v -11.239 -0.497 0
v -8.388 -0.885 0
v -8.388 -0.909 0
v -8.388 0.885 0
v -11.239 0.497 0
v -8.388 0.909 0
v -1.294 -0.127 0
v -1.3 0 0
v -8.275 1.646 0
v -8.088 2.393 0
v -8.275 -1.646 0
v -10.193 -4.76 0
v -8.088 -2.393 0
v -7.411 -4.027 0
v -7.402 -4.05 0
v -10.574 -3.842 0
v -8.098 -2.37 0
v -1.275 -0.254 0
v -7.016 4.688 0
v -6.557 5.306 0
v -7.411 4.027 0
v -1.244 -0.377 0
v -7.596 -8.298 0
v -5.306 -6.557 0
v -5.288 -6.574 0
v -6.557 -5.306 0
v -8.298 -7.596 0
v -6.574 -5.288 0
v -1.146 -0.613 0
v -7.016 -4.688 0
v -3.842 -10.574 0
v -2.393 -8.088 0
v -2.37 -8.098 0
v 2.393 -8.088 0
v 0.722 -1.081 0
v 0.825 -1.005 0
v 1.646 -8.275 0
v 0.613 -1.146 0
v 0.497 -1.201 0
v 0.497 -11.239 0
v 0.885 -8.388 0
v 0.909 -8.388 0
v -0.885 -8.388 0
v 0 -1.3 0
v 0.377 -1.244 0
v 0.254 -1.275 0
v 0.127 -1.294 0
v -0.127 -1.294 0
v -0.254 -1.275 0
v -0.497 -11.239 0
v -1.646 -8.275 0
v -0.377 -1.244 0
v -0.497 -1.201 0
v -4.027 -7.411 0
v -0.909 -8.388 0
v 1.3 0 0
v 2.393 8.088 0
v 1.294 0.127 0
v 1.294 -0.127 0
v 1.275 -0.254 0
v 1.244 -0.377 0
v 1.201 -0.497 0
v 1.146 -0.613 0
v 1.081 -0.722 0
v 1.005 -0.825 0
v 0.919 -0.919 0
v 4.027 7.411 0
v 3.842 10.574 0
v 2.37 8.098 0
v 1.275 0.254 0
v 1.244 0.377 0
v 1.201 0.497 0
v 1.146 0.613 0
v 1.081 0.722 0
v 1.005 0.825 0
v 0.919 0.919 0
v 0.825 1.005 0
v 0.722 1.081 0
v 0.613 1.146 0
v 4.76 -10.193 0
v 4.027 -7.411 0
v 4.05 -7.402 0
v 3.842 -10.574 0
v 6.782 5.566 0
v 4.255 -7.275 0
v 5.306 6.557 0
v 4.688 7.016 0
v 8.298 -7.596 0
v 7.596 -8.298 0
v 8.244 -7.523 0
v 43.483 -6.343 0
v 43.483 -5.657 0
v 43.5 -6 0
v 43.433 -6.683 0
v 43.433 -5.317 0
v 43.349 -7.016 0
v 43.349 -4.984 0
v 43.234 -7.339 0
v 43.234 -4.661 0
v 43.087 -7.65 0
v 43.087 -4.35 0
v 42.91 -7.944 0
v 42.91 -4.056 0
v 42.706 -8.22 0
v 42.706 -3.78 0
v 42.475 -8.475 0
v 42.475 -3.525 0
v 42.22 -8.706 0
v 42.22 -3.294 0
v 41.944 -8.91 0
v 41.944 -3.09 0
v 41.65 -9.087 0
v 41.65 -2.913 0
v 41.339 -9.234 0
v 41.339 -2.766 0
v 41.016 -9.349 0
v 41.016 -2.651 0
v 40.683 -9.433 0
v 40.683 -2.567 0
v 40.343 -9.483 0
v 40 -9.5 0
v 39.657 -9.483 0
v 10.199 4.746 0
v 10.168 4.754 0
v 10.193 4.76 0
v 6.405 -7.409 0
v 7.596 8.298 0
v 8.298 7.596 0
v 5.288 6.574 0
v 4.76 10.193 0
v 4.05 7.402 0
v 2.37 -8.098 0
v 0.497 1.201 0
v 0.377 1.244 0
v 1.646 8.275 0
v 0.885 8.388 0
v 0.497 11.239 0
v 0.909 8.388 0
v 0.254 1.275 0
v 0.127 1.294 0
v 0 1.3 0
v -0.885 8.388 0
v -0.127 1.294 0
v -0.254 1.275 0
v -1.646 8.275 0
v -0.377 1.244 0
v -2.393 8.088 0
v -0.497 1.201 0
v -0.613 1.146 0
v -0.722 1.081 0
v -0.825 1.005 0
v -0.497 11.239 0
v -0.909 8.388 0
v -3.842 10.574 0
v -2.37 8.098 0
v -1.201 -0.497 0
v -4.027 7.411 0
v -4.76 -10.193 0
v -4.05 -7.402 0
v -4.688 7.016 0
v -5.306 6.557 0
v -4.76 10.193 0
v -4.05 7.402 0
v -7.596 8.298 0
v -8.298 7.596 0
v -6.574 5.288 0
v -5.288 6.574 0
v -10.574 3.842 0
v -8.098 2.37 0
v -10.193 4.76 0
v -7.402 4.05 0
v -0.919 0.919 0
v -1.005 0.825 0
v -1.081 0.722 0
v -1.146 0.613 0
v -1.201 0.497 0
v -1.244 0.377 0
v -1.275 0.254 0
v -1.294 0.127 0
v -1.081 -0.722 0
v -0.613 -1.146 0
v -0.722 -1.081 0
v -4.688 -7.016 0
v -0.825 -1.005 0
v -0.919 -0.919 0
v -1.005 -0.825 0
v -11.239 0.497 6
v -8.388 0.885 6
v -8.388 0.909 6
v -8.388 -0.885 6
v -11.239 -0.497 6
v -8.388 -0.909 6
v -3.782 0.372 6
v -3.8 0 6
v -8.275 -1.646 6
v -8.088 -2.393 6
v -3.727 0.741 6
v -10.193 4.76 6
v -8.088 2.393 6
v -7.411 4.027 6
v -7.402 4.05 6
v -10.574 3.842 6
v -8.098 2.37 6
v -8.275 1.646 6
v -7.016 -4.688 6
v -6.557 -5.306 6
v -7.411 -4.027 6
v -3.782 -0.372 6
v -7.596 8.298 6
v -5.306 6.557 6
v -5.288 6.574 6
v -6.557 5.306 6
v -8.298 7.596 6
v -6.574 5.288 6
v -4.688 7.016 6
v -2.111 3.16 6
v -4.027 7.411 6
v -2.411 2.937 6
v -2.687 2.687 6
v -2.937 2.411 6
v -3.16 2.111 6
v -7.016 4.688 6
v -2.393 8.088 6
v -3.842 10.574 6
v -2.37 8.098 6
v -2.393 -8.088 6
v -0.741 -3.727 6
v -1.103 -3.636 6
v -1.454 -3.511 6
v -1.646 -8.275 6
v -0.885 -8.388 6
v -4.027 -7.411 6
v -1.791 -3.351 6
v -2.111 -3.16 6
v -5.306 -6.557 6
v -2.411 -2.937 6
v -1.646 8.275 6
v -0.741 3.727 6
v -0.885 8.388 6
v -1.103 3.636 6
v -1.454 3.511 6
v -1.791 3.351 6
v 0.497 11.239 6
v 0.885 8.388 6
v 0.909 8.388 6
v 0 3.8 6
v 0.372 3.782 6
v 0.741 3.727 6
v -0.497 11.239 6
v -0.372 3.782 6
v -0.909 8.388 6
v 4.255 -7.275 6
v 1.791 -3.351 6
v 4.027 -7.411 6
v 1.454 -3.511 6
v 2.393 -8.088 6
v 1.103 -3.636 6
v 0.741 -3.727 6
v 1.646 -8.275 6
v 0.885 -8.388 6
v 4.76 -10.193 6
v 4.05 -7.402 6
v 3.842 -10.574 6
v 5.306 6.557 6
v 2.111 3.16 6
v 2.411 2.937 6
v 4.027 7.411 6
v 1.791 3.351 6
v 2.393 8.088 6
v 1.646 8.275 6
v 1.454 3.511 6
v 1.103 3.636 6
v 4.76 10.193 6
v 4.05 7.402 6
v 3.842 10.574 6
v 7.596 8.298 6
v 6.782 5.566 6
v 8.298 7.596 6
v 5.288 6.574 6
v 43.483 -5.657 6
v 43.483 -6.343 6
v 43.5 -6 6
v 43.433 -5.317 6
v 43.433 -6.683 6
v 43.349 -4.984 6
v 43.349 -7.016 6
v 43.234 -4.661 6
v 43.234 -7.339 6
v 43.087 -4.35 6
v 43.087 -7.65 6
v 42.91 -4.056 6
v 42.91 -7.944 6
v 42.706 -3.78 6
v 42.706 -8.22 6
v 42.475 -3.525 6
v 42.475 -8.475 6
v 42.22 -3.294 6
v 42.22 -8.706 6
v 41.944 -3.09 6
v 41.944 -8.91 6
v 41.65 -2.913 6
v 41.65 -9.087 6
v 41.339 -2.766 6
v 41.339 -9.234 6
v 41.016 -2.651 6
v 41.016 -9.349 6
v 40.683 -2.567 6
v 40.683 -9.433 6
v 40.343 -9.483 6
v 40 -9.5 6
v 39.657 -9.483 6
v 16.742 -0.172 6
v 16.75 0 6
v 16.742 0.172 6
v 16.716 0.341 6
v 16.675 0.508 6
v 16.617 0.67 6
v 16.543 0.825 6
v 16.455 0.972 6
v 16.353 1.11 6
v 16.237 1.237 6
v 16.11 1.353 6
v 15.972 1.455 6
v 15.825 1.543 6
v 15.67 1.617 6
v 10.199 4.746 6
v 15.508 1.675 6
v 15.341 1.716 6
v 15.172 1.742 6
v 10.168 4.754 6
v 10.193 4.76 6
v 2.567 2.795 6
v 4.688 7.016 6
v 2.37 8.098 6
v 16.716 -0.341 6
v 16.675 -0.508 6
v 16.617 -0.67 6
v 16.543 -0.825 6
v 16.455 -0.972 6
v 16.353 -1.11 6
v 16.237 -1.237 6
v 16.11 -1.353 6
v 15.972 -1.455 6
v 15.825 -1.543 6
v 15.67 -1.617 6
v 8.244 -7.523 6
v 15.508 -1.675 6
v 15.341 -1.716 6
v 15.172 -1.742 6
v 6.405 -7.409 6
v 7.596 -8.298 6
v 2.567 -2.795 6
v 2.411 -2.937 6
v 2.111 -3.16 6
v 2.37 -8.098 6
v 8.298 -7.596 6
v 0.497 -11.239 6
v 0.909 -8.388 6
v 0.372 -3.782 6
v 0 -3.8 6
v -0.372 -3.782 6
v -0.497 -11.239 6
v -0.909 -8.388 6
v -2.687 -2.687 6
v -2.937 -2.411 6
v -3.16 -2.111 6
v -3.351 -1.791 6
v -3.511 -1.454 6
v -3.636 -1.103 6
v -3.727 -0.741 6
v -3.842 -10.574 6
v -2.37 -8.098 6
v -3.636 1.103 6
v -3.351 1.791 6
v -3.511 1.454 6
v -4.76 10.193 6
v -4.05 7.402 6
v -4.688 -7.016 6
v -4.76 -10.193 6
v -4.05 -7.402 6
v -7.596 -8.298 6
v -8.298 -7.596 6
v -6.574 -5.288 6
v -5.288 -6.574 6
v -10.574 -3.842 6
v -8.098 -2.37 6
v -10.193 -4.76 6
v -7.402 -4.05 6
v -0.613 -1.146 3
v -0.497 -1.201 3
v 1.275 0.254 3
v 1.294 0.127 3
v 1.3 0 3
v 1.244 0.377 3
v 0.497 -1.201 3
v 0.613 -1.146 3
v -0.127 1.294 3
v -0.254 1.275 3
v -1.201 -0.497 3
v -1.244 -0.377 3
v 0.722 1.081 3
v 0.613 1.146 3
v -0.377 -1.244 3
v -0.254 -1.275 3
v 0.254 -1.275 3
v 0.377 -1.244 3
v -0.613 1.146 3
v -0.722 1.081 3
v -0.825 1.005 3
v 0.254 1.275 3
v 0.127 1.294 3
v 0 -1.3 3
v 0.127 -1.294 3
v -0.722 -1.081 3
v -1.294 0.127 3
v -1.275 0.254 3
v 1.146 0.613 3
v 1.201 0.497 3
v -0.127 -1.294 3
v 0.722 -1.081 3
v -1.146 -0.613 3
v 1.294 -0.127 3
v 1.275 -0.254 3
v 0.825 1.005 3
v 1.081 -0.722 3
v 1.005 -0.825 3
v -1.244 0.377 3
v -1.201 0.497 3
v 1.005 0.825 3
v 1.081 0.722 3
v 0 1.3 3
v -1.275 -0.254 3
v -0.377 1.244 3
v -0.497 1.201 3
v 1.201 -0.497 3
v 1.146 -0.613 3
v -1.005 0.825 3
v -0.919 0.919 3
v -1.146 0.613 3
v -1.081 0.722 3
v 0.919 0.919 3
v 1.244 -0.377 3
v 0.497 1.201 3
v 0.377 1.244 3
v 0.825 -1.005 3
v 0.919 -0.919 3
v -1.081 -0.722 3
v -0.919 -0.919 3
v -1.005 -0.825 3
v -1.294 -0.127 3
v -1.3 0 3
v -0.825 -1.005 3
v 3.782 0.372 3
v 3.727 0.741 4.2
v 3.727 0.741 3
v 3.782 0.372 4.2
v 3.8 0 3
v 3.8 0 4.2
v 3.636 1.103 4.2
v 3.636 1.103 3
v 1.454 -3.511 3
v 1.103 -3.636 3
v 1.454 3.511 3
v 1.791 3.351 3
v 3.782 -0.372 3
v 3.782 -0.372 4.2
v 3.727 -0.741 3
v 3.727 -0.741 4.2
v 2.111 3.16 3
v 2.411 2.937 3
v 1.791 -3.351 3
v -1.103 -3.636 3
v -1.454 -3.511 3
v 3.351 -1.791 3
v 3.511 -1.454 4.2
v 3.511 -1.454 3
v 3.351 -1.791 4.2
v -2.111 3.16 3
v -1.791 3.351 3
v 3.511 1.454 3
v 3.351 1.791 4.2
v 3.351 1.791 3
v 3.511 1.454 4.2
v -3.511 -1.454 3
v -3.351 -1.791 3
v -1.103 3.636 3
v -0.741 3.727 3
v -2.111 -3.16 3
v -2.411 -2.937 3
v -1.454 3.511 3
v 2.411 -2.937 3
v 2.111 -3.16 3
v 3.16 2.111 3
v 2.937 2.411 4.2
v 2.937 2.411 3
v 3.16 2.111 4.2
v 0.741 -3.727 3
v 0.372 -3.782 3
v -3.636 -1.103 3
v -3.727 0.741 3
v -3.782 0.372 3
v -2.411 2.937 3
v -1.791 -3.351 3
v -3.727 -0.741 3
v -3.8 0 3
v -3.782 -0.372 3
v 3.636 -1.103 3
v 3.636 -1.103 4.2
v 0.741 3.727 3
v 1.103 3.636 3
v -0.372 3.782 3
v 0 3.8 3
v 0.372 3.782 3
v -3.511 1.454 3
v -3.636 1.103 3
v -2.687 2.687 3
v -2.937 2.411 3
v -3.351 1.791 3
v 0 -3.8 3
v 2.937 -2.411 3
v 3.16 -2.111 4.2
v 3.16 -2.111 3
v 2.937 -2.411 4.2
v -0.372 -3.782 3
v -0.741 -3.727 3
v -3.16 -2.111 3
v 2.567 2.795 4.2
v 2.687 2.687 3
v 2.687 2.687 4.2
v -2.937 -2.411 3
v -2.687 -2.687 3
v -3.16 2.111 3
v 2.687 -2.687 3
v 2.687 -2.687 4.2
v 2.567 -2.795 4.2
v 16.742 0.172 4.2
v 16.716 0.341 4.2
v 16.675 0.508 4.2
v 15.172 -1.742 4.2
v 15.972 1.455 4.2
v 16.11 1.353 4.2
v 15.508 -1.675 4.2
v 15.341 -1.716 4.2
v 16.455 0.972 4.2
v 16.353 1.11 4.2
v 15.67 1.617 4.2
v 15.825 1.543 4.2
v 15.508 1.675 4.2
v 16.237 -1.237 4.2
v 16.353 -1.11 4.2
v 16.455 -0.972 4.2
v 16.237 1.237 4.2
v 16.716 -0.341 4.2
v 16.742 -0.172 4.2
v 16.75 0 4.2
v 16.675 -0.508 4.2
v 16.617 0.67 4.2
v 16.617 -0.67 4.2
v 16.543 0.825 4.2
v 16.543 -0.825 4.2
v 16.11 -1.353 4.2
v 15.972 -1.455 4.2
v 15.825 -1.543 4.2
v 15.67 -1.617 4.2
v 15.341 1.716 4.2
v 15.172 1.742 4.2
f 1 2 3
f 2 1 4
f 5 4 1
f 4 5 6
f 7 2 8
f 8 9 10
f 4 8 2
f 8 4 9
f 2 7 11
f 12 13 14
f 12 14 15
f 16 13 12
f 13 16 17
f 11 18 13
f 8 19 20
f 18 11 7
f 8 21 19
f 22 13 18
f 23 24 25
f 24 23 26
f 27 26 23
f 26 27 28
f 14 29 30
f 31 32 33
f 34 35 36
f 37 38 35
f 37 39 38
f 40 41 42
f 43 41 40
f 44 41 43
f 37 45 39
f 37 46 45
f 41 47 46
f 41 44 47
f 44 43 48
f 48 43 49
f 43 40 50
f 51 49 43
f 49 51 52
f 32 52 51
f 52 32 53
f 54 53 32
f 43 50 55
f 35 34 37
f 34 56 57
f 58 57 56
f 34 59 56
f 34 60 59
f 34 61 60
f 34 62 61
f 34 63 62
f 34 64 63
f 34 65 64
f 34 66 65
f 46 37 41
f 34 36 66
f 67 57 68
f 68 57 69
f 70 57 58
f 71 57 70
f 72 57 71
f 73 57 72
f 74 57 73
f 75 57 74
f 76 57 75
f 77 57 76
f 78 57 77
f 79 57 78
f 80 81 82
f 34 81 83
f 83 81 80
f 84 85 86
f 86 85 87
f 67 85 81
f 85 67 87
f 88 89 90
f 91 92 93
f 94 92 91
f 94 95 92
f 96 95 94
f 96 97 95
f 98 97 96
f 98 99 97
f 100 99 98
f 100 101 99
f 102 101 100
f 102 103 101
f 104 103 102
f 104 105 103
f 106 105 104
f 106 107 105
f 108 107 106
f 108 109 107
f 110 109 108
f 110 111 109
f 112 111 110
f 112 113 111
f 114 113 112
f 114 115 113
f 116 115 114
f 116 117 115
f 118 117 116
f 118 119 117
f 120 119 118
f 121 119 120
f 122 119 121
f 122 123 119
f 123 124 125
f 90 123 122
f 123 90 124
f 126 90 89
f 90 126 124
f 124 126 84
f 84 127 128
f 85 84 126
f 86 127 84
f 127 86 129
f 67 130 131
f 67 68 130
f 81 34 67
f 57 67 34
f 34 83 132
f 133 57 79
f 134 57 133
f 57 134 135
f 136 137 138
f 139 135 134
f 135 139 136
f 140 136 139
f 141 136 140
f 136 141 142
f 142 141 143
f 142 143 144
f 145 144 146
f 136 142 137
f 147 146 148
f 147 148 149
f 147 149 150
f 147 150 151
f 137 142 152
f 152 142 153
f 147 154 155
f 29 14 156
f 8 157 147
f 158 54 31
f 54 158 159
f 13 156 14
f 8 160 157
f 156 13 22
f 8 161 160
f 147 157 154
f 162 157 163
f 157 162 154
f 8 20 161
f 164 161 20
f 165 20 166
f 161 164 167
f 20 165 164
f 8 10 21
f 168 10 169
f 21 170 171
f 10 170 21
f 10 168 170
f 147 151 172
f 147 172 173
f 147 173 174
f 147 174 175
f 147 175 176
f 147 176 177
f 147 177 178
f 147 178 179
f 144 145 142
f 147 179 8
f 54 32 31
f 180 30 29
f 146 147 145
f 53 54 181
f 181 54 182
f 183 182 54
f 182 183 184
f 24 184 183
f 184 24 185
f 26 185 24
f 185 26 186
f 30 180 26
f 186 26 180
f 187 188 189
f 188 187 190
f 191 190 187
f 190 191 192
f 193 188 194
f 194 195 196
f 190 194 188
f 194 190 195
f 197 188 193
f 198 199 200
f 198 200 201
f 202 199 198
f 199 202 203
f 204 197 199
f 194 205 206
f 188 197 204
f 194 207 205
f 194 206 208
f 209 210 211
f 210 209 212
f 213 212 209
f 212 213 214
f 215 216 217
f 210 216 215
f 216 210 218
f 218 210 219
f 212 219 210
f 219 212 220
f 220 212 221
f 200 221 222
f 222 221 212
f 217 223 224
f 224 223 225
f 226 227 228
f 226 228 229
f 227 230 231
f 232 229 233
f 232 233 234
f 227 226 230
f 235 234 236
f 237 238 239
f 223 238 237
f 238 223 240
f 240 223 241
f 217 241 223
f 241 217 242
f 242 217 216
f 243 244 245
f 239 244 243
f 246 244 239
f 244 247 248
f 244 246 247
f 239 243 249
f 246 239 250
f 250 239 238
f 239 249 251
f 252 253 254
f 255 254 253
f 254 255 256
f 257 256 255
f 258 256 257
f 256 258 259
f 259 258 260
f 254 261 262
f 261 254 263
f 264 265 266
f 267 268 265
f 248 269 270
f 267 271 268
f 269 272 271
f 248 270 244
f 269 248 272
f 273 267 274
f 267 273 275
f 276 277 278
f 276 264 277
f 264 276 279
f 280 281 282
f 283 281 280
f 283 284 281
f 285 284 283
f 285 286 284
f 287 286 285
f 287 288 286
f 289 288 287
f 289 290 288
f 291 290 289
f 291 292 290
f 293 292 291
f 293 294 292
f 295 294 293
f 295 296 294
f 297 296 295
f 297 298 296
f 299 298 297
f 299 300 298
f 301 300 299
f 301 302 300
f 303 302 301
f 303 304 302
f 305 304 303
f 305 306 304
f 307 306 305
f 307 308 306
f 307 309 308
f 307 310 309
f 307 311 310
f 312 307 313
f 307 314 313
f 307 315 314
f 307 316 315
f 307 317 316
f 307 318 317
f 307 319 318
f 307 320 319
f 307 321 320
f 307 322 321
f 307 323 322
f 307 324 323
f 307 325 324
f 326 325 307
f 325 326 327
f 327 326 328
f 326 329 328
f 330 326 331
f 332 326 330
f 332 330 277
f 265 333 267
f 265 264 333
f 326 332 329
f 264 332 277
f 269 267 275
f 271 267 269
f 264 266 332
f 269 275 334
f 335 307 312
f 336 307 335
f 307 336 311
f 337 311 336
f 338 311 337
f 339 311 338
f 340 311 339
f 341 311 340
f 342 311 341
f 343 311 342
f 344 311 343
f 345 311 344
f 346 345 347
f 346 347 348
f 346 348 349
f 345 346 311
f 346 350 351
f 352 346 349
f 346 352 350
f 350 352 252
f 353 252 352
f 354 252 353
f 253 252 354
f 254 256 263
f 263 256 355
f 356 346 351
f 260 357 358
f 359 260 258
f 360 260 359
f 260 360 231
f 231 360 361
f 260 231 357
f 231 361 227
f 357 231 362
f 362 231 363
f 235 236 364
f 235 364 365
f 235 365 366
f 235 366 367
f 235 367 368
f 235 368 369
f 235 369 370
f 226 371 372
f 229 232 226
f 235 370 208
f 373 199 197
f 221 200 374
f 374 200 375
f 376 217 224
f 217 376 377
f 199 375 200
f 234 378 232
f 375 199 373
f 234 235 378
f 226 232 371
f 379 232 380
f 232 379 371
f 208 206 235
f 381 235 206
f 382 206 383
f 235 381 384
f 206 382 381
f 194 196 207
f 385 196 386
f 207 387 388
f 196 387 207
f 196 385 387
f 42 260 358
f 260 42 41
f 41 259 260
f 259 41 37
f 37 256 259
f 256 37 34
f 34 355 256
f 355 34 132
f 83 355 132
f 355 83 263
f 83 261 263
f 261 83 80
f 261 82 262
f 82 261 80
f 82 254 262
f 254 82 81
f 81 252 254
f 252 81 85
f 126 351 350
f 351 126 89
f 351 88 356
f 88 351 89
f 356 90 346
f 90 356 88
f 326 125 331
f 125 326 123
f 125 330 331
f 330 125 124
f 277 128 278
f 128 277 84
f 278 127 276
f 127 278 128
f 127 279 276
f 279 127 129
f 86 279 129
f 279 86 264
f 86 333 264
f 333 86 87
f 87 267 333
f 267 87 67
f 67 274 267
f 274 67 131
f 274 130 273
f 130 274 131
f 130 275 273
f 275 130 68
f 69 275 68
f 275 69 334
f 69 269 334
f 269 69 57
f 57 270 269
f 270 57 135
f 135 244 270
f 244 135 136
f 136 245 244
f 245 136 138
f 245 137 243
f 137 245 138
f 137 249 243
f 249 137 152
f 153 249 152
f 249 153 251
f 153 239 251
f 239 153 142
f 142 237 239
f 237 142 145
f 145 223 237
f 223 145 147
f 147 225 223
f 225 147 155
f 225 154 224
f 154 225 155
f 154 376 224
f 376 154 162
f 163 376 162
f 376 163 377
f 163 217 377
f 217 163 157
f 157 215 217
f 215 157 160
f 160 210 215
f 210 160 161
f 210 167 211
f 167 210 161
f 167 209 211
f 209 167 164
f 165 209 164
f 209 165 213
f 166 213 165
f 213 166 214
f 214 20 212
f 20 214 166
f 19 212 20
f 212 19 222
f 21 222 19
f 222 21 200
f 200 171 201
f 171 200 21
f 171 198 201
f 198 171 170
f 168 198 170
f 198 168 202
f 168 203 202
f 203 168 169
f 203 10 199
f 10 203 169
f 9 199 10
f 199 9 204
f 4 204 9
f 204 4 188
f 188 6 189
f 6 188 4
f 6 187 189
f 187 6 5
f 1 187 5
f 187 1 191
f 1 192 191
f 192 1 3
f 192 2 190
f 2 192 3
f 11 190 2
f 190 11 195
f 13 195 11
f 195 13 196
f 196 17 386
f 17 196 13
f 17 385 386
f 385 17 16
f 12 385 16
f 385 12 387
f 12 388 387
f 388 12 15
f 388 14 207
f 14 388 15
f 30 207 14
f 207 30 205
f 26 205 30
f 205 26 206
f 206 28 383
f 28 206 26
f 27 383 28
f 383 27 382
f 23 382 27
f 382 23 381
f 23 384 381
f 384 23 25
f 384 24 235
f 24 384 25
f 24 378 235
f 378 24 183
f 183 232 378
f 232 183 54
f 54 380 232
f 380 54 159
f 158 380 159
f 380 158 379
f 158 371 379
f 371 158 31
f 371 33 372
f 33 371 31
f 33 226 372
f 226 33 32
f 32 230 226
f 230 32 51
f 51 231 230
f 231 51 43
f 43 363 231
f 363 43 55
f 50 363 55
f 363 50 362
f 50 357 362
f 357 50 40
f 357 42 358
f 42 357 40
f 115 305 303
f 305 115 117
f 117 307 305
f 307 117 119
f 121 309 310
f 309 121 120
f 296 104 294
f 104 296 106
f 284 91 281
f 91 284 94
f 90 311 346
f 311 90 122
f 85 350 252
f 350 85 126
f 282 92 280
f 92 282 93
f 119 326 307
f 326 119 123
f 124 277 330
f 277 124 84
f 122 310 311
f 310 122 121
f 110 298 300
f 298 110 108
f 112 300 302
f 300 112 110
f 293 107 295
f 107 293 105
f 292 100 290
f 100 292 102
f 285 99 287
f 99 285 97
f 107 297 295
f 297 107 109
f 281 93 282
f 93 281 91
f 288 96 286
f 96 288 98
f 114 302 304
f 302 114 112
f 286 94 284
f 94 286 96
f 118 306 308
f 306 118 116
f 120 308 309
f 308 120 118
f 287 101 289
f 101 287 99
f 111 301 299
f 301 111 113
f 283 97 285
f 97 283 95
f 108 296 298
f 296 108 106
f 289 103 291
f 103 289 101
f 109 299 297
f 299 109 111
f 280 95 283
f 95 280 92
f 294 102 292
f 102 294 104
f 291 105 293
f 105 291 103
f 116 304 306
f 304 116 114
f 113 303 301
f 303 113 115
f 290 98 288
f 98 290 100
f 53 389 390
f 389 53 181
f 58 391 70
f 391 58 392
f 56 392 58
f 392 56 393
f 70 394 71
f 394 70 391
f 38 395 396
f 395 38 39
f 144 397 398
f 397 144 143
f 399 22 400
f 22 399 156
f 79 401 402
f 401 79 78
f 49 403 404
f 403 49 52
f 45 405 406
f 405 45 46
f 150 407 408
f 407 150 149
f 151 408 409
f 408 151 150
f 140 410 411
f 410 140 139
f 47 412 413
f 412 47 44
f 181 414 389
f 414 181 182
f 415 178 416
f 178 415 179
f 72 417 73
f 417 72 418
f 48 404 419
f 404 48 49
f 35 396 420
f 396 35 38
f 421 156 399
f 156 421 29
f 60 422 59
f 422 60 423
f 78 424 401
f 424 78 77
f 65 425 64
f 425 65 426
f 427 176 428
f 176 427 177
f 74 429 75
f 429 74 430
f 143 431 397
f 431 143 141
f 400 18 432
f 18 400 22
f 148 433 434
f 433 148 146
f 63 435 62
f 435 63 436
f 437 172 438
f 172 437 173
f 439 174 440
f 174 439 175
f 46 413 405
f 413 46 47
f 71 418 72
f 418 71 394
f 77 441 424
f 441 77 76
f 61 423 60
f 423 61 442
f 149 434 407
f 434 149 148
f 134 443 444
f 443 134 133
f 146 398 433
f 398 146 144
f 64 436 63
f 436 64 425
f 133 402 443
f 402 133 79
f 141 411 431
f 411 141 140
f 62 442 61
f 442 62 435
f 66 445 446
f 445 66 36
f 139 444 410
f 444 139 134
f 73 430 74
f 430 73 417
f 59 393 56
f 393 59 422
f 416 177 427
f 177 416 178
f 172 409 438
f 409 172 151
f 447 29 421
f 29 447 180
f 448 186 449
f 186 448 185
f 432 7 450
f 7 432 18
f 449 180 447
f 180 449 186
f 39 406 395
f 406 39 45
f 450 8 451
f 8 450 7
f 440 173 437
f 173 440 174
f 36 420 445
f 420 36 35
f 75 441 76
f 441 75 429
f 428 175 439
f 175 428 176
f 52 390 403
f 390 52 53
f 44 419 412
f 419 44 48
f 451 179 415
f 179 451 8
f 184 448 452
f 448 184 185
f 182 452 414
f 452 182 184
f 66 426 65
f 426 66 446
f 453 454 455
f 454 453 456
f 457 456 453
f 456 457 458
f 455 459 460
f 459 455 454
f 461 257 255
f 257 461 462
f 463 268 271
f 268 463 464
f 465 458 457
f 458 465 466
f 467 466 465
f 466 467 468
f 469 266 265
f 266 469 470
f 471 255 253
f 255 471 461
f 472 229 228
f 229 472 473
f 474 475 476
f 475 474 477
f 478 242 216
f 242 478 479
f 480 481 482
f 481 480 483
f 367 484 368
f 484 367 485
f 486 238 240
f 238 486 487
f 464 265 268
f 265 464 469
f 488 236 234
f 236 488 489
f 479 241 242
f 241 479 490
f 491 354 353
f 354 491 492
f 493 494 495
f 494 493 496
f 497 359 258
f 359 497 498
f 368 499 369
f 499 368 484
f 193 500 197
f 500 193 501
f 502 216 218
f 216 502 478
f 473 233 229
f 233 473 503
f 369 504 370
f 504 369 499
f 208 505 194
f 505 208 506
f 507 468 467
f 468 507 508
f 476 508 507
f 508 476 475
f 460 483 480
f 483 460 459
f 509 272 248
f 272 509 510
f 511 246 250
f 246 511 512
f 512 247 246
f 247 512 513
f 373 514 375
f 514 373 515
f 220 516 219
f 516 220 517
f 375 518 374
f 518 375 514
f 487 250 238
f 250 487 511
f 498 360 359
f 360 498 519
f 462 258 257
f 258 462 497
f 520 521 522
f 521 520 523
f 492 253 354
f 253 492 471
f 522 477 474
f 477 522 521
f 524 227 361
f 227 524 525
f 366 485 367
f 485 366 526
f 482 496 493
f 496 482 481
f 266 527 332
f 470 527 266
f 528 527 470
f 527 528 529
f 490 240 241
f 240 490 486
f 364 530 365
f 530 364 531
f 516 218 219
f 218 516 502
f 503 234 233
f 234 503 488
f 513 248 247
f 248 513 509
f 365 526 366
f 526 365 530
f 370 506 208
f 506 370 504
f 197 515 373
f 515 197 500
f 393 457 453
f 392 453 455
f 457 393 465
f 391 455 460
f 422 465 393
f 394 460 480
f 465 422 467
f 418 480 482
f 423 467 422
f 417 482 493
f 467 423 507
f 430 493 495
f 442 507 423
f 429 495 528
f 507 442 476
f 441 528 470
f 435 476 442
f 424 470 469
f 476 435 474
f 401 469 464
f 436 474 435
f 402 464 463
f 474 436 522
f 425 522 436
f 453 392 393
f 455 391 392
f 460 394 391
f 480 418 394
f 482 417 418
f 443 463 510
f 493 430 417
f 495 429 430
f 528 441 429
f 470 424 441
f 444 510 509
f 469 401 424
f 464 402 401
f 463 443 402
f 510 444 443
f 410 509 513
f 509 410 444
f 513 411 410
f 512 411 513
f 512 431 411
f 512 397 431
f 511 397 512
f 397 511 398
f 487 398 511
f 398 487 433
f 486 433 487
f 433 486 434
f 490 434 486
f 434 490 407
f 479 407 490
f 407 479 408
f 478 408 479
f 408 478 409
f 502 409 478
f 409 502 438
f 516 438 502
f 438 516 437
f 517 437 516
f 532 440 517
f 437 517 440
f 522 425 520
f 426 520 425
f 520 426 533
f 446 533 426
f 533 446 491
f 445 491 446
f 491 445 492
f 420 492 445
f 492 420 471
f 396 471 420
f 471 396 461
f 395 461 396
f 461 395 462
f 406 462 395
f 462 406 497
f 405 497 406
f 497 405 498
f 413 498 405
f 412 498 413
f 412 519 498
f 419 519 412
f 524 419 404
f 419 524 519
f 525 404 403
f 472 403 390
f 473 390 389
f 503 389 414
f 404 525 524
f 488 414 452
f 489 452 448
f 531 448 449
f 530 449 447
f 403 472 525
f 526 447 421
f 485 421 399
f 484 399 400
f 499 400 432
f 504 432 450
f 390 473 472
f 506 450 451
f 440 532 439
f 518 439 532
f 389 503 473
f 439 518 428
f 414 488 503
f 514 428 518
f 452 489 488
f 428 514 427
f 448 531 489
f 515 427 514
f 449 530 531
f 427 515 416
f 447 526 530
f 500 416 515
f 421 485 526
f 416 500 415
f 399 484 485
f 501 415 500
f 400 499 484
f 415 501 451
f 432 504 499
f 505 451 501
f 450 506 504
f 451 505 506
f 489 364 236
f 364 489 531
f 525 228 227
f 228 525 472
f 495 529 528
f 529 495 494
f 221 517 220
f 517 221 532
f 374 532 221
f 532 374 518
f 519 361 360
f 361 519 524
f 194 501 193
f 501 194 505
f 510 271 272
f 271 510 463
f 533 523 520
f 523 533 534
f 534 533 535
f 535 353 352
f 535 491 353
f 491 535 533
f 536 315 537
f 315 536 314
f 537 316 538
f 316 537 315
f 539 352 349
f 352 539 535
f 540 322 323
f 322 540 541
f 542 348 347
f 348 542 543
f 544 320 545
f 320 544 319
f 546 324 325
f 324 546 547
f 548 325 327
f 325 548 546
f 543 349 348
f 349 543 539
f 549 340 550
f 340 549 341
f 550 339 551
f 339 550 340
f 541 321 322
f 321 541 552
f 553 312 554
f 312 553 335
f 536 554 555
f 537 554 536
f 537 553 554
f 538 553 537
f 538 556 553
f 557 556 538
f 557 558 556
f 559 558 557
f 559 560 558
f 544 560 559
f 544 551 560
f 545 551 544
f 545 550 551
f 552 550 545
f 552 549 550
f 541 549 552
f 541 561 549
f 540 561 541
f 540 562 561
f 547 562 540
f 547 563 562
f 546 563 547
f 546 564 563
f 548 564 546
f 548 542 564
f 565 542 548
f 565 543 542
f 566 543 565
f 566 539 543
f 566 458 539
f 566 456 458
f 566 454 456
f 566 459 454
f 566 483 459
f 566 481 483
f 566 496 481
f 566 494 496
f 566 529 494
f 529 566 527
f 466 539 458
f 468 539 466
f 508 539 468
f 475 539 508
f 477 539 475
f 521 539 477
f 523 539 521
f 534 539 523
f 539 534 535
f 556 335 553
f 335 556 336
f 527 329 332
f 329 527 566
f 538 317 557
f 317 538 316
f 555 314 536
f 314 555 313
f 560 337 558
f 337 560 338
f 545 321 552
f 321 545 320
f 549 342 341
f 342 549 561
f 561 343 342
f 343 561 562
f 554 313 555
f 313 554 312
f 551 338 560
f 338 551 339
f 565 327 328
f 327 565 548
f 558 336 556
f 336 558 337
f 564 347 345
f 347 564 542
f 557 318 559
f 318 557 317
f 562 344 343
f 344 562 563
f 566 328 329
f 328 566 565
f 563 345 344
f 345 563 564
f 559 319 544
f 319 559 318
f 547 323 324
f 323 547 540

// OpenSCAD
// file: ../lib.scad
// Solar Rover - shared helper modules
include <config.scad>

// Rounded rectangle plate, centred in XY, sitting on Z=0.
module rbox(size, r=4) {
    x = size[0]; y = size[1]; z = size[2];
    hull() for (sx=[-1,1], sy=[-1,1])
        translate([sx*(x/2-r), sy*(y/2-r), 0]) cylinder(r=r, h=z);
}

// Vertical hole through everything (subtract). Centred on the origin.
module hole(d, h=200) { translate([0,0,-h/2]) cylinder(d=d, h=h); }

// Heat-set insert pocket opening upward at Z=top.
module insert_m3(top) { translate([0,0,top-m3_insert_h]) cylinder(d=m3_insert_d, h=m3_insert_h+0.01); }
module insert_m25(top) { translate([0,0,top-4.5]) cylinder(d=m25_insert_d, h=4.51); }

// Boss for an insert: cylinder from z0 to z1, with insert pocket at the top.
module insert_boss_m3(z0, z1, od=8) {
    difference() {
        translate([0,0,z0]) cylinder(d=od, h=z1-z0);
        insert_m3(z1);
    }
}

// Slot of length l (centre-to-centre) along X, diameter d.
module slot(l, d, h=200) {
    hull() for (sx=[-1,1]) translate([sx*l/2,0,-h/2]) cylinder(d=d, h=h);
}

// Counterbored M3 clearance hole, head at Z=top going down.
module m3_cbore(top, depth=m3_head_h) {
    hole(m3_clear);
    translate([0,0,top-depth]) cylinder(d=m3_head_d, h=depth+50);
}

// Captive hex nut pocket, opening at Z=z (nut goes in from that face).
module m3_nut_pocket(z, depth=m3_nut_h+0.4) {
    translate([0,0,z-depth]) cylinder(d=m3_nut_af/cos(30), h=depth+0.01, $fn=6);
}

// Pair of zip-tie slots (for modules without mounting holes), spaced s apart along X.
module zip_slots(s=30, w=4, l=2.2) {
    for (sx=[-1,1]) translate([sx*s/2,0,0]) cube([l, w, 50], center=true);
}

// D-shaped bore for TT motor shafts.
module d_bore(h=50, extra=0) {
    intersection() {
        cylinder(d=tt_shaft_d+extra, h=h);
        translate([-(tt_shaft_d+extra)/2, -(tt_shaft_flat+extra)/2, 0])
            cube([tt_shaft_d+extra, tt_shaft_flat+extra, h]);
    }
}

// Simple spur gear (trapezoid teeth), module m, z teeth, thickness t. Good enough
// for a slow servo gripper; not a precision involute.
module spur_gear(m=1.25, z=16, t=6, bore=0) {
    rp = m*z/2; ra = rp + m; rf = rp - 1.25*m;
    difference() {
        linear_extrude(t) union() {
            circle(r=rf, $fn=z*4);
            for (i=[0:z-1]) rotate(i*360/z)
                polygon([[rf*cos(-90/z*1.1), rf*sin(-90/z*1.1)],
                         [ra*cos(-90/z*0.45), ra*sin(-90/z*0.45)],
                         [ra*cos( 90/z*0.45), ra*sin( 90/z*0.45)],
                         [rf*cos( 90/z*1.1), rf*sin( 90/z*1.1)]]);
        }
        if (bore > 0) hole(bore);
    }
}

// Servo pocket for an MG996R lying with its output axis along +Z.
// Case centred so the OUTPUT SHAFT is at the origin; case top at Z=0.
module mg996_case_neg(extra=tol) {
    translate([-mg996_shaft_off-extra, -mg996_w/2-extra, -mg996_h-extra])
        cube([mg996_l+2*extra, mg996_w+2*extra, mg996_h+extra+0.01]);
}
module mg996_flange_holes(d=m3_clear, h=60) {
    cx = mg996_l/2 - mg996_shaft_off;
    for (sx=[-1,1], sy=[-1,1])
        translate([cx+sx*mg996_hole_dx/2, sy*mg996_hole_dy/2, -h/2]) cylinder(d=d, h=h);
}
module mg90_case_neg(extra=tol) {
    translate([-mg90_shaft_off-extra, -mg90_w/2-extra, -mg90_h-extra])
        cube([mg90_l+2*extra, mg90_w+2*extra, mg90_h+extra+0.01]);
}
module mg90_flange_holes(d=m2_pilot, h=60) {
    cx = mg90_l/2 - mg90_shaft_off;
    for (sx=[-1,1]) translate([cx+sx*mg90_hole_dx/2, 0, -h/2]) cylinder(d=d, h=h);
}
// Round MG996R horn screw pattern (4 holes) + centre relief.
module mg996_horn_holes(d=m3_clear) {
    hole(9);
    for (a=[0:90:270]) rotate(a) translate([mg996_horn_hole_r,0,0]) hole(d);
}
// file: ../config.scad
// Solar Rover - shared dimensions (all mm)
// Coordinate system: X = forward, Y = left, Z = up. Origin = deck centre, ground at Z=0.
//
// Values marked MEASURE come from typical datasheets/clones and vary between
// suppliers. Measure your parts with calipers and edit them here before printing;
// every part reads its dimensions from this file.

$fn = 64;

// ---------- print / fit ----------
tol        = 0.25;   // general clearance per side
wall       = 2.4;    // default wall (6 perimeters at 0.4 mm nozzle)

// ---------- fasteners ----------
m3_clear     = 3.4;   // M3 clearance hole
m3_insert_d  = 4.1;   // hole for M3x5x4 brass heat-set insert (OD ~4.6)
m3_insert_h  = 5.5;   // insert hole depth
m3_head_d    = 6.2;   // socket head counterbore
m3_head_h    = 3.2;
m3_nut_af    = 5.6;   // nut across flats (+clearance)
m3_nut_h     = 2.6;
m25_clear    = 2.9;
m25_insert_d = 3.5;   // M2.5 insert hole (OD ~4.0)
m2_clear     = 2.4;
m2_pilot     = 1.7;   // pilot hole for M2 thread-forming screw

// ---------- deck ----------
deck_l     = 300;     // printed as two 150 mm halves
deck_w     = 146;
deck_t     = 4;
rib_h      = 8;
rib_w      = 2.4;
flange_h   = 14;      // joint flange (bolts the halves together)
flange_t   = 5;

// ---------- drive ----------
wheel_d       = 65;
wheel_w       = 26;
axle_z        = wheel_d/2;    // axle height above ground
axle_x        = 100;          // front axle at +axle_x, rear at -axle_x
// TT gear motor (dual-shaft, 1:48). MEASURE.
tt_body_l     = 64;           // along X (gearbox + motor can)
tt_body_t     = 22.5;         // along Y (shaft direction)
tt_body_h     = 18.8;         // along Z
tt_shaft_from_end = 11.3;     // shaft centre to gearbox front end
tt_shaft_d    = 5.4;          // D-shaft across round
tt_shaft_flat = 3.7;          // D-shaft across flats
tt_shaft_len  = 9;            // per side, beyond the body face
// two through-holes parallel to the shaft, positions relative to shaft centre [x, z]. MEASURE.
tt_holes      = [[-20.0, 5.5], [-20.0, -5.5]];
motor_outer_y = 72;           // motor face nearest the wheel
clamp_t       = 3;            // clamp plate thickness
deck_bottom_z = axle_z + tt_body_h/2 + clamp_t;   // 44.6
deck_top_z    = deck_bottom_z + deck_t;

// ---------- encoder ----------
enc_slots   = 20;
enc_disc_d  = 22;
enc_disc_t  = 1.6;

// ---------- turret / arm ----------
turret_x      = 108;
turret_d      = 84;           // base OD; top plate skirt overlaps it
turret_h      = 48;           // fixed base height above deck (servo hangs inside)
turret_deck_r = 30;           // 4x M3 at 45/135/225/315 deg: turret base to deck
turret_bolts  = [[20,28],[-20,28],[20,-28],[-20,-28]];  // module interface on the turret top (4x M3)
shoulder_z    = 45;           // shoulder axis above the turret top plate
// MG996R servo. MEASURE.
mg996_l   = 40.7;  mg996_w = 19.7;  mg996_h = 37.0;   // case (h = to top of case)
mg996_flange_l = 54.5; mg996_flange_z = 27.5;  mg996_flange_t = 2.5;
mg996_hole_dx = 49.5; mg996_hole_dy = 10.0; mg996_hole_d = 4.5;
mg996_shaft_off = 10.0;       // output shaft centre from case end
mg996_spline_h  = 6.0;        // case top to horn face
mg996_horn_d    = 22;         // round metal horn
mg996_horn_hole_r = 7.5;      // horn screw circle radius (MEASURE: usually 4 holes)
// MG90S servo. MEASURE.
mg90_l = 22.8; mg90_w = 12.2; mg90_h = 22.7;
mg90_flange_l = 32.5; mg90_flange_z = 16.0; mg90_flange_t = 2.5;
mg90_hole_dx = 27.6; mg90_hole_d = 2.0;
mg90_shaft_off = 6.0;
mg90_spline_h = 5.0;
mg90_horn_d = 7;              // horn hub (single-arm horn)

link_upper = 100;   // shoulder -> elbow
link_fore  = 90;    // elbow -> wrist
link_hand  = 70;    // wrist -> fingertip

// ---------- power / electronics ----------
cell_holder = [77, 80, 21];   // 4x18650 holder footprint. MEASURE.
pi0_holes   = [58, 23];       // Raspberry Pi Zero 2 W, M2.5
pca_holes   = [55.9, 19.0];   // Adafruit-style PCA9685, M2.5. MEASURE (clones vary)
esp_exp_holes = [47, 70];     // ESP32 38-pin screw-terminal expansion board (77x54 mm), M3. MEASURE.
cradle_tb6612 = [20.5, 20.5];  // TB6612FNG breakout board outline. MEASURE.
cradle_mp1584 = [22.4, 17.0];  // MP1584 mini buck outline. MEASURE.
module_slot_w = 2.6;          // module-plate slots: M2/M2.5 screw + nut, or a 2.5 mm zip tie
tray_standoff_h = 32;         // power tray top to logic tray underside
// charge tray: a slotted plate on 4 legs over the battery holder
charge_tray_c    = [-106, 0];         // centre on the deck (same as the battery holder)
charge_tray_size = [76, 102];         // X, Y
charge_tray_z    = 24;                // deck top to plate underside (holder is 21 mm tall)
charge_tray_legs = [for (x=[-34,28], sy=[-1,1]) [x, sy*46]];   // relative to the centre; the front pair clears the motor-clamp inserts

// ---------- body / solar ----------
panel     = [110, 136, 3];    // 6V 2W panel: X, Y, thickness. MEASURE.
roof_post_h = 75;             // deck top to roof tray underside (room for plugged-in jumpers)
tray_frame  = 4;
roof_front_x = 60;            // front tray spans -60..60, rear tray -180..-60
// main file
// Gripper finger with gear (print 2): variant="driven" (fits the MG90S horn) and
// variant="idler" (spins on an M3x12 pin + washer). Print flat, 100% infill.
// Glue a strip of TPU or rubber on the inner face for grip.
include <../config.scad>
use <../lib.scad>

variant = "driven";
m = 1.25; z = 16; t = 6;
s = (variant == "driven") ? 1 : -1;   // driven finger sits at +Y of the idler

difference() {
    union() {
        rotate(variant == "driven" ? 0 : 180/z) spur_gear(m, z, t);
        // finger: from the gear to a tip 40 mm ahead. The axes are 20 mm apart, so a
        // tip centre 6 mm toward the other finger leaves a 1 mm gap when closed.
        hull() {
            cylinder(r=7, h=t);
            translate([40, -s*6, 0]) cylinder(r=3.5, h=t);
        }
    }
    if (variant == "driven") {
        hole(2.6);                                // horn screw
        translate([0,0,t-3]) cylinder(d=7.6, h=4); // horn hub
        translate([0,0,t-1.8]) hull() { cylinder(d=6, h=2); translate([15,0,0]) cylinder(d=3.5, h=2); } // single-arm horn
    } else hole(m3_clear);
}
